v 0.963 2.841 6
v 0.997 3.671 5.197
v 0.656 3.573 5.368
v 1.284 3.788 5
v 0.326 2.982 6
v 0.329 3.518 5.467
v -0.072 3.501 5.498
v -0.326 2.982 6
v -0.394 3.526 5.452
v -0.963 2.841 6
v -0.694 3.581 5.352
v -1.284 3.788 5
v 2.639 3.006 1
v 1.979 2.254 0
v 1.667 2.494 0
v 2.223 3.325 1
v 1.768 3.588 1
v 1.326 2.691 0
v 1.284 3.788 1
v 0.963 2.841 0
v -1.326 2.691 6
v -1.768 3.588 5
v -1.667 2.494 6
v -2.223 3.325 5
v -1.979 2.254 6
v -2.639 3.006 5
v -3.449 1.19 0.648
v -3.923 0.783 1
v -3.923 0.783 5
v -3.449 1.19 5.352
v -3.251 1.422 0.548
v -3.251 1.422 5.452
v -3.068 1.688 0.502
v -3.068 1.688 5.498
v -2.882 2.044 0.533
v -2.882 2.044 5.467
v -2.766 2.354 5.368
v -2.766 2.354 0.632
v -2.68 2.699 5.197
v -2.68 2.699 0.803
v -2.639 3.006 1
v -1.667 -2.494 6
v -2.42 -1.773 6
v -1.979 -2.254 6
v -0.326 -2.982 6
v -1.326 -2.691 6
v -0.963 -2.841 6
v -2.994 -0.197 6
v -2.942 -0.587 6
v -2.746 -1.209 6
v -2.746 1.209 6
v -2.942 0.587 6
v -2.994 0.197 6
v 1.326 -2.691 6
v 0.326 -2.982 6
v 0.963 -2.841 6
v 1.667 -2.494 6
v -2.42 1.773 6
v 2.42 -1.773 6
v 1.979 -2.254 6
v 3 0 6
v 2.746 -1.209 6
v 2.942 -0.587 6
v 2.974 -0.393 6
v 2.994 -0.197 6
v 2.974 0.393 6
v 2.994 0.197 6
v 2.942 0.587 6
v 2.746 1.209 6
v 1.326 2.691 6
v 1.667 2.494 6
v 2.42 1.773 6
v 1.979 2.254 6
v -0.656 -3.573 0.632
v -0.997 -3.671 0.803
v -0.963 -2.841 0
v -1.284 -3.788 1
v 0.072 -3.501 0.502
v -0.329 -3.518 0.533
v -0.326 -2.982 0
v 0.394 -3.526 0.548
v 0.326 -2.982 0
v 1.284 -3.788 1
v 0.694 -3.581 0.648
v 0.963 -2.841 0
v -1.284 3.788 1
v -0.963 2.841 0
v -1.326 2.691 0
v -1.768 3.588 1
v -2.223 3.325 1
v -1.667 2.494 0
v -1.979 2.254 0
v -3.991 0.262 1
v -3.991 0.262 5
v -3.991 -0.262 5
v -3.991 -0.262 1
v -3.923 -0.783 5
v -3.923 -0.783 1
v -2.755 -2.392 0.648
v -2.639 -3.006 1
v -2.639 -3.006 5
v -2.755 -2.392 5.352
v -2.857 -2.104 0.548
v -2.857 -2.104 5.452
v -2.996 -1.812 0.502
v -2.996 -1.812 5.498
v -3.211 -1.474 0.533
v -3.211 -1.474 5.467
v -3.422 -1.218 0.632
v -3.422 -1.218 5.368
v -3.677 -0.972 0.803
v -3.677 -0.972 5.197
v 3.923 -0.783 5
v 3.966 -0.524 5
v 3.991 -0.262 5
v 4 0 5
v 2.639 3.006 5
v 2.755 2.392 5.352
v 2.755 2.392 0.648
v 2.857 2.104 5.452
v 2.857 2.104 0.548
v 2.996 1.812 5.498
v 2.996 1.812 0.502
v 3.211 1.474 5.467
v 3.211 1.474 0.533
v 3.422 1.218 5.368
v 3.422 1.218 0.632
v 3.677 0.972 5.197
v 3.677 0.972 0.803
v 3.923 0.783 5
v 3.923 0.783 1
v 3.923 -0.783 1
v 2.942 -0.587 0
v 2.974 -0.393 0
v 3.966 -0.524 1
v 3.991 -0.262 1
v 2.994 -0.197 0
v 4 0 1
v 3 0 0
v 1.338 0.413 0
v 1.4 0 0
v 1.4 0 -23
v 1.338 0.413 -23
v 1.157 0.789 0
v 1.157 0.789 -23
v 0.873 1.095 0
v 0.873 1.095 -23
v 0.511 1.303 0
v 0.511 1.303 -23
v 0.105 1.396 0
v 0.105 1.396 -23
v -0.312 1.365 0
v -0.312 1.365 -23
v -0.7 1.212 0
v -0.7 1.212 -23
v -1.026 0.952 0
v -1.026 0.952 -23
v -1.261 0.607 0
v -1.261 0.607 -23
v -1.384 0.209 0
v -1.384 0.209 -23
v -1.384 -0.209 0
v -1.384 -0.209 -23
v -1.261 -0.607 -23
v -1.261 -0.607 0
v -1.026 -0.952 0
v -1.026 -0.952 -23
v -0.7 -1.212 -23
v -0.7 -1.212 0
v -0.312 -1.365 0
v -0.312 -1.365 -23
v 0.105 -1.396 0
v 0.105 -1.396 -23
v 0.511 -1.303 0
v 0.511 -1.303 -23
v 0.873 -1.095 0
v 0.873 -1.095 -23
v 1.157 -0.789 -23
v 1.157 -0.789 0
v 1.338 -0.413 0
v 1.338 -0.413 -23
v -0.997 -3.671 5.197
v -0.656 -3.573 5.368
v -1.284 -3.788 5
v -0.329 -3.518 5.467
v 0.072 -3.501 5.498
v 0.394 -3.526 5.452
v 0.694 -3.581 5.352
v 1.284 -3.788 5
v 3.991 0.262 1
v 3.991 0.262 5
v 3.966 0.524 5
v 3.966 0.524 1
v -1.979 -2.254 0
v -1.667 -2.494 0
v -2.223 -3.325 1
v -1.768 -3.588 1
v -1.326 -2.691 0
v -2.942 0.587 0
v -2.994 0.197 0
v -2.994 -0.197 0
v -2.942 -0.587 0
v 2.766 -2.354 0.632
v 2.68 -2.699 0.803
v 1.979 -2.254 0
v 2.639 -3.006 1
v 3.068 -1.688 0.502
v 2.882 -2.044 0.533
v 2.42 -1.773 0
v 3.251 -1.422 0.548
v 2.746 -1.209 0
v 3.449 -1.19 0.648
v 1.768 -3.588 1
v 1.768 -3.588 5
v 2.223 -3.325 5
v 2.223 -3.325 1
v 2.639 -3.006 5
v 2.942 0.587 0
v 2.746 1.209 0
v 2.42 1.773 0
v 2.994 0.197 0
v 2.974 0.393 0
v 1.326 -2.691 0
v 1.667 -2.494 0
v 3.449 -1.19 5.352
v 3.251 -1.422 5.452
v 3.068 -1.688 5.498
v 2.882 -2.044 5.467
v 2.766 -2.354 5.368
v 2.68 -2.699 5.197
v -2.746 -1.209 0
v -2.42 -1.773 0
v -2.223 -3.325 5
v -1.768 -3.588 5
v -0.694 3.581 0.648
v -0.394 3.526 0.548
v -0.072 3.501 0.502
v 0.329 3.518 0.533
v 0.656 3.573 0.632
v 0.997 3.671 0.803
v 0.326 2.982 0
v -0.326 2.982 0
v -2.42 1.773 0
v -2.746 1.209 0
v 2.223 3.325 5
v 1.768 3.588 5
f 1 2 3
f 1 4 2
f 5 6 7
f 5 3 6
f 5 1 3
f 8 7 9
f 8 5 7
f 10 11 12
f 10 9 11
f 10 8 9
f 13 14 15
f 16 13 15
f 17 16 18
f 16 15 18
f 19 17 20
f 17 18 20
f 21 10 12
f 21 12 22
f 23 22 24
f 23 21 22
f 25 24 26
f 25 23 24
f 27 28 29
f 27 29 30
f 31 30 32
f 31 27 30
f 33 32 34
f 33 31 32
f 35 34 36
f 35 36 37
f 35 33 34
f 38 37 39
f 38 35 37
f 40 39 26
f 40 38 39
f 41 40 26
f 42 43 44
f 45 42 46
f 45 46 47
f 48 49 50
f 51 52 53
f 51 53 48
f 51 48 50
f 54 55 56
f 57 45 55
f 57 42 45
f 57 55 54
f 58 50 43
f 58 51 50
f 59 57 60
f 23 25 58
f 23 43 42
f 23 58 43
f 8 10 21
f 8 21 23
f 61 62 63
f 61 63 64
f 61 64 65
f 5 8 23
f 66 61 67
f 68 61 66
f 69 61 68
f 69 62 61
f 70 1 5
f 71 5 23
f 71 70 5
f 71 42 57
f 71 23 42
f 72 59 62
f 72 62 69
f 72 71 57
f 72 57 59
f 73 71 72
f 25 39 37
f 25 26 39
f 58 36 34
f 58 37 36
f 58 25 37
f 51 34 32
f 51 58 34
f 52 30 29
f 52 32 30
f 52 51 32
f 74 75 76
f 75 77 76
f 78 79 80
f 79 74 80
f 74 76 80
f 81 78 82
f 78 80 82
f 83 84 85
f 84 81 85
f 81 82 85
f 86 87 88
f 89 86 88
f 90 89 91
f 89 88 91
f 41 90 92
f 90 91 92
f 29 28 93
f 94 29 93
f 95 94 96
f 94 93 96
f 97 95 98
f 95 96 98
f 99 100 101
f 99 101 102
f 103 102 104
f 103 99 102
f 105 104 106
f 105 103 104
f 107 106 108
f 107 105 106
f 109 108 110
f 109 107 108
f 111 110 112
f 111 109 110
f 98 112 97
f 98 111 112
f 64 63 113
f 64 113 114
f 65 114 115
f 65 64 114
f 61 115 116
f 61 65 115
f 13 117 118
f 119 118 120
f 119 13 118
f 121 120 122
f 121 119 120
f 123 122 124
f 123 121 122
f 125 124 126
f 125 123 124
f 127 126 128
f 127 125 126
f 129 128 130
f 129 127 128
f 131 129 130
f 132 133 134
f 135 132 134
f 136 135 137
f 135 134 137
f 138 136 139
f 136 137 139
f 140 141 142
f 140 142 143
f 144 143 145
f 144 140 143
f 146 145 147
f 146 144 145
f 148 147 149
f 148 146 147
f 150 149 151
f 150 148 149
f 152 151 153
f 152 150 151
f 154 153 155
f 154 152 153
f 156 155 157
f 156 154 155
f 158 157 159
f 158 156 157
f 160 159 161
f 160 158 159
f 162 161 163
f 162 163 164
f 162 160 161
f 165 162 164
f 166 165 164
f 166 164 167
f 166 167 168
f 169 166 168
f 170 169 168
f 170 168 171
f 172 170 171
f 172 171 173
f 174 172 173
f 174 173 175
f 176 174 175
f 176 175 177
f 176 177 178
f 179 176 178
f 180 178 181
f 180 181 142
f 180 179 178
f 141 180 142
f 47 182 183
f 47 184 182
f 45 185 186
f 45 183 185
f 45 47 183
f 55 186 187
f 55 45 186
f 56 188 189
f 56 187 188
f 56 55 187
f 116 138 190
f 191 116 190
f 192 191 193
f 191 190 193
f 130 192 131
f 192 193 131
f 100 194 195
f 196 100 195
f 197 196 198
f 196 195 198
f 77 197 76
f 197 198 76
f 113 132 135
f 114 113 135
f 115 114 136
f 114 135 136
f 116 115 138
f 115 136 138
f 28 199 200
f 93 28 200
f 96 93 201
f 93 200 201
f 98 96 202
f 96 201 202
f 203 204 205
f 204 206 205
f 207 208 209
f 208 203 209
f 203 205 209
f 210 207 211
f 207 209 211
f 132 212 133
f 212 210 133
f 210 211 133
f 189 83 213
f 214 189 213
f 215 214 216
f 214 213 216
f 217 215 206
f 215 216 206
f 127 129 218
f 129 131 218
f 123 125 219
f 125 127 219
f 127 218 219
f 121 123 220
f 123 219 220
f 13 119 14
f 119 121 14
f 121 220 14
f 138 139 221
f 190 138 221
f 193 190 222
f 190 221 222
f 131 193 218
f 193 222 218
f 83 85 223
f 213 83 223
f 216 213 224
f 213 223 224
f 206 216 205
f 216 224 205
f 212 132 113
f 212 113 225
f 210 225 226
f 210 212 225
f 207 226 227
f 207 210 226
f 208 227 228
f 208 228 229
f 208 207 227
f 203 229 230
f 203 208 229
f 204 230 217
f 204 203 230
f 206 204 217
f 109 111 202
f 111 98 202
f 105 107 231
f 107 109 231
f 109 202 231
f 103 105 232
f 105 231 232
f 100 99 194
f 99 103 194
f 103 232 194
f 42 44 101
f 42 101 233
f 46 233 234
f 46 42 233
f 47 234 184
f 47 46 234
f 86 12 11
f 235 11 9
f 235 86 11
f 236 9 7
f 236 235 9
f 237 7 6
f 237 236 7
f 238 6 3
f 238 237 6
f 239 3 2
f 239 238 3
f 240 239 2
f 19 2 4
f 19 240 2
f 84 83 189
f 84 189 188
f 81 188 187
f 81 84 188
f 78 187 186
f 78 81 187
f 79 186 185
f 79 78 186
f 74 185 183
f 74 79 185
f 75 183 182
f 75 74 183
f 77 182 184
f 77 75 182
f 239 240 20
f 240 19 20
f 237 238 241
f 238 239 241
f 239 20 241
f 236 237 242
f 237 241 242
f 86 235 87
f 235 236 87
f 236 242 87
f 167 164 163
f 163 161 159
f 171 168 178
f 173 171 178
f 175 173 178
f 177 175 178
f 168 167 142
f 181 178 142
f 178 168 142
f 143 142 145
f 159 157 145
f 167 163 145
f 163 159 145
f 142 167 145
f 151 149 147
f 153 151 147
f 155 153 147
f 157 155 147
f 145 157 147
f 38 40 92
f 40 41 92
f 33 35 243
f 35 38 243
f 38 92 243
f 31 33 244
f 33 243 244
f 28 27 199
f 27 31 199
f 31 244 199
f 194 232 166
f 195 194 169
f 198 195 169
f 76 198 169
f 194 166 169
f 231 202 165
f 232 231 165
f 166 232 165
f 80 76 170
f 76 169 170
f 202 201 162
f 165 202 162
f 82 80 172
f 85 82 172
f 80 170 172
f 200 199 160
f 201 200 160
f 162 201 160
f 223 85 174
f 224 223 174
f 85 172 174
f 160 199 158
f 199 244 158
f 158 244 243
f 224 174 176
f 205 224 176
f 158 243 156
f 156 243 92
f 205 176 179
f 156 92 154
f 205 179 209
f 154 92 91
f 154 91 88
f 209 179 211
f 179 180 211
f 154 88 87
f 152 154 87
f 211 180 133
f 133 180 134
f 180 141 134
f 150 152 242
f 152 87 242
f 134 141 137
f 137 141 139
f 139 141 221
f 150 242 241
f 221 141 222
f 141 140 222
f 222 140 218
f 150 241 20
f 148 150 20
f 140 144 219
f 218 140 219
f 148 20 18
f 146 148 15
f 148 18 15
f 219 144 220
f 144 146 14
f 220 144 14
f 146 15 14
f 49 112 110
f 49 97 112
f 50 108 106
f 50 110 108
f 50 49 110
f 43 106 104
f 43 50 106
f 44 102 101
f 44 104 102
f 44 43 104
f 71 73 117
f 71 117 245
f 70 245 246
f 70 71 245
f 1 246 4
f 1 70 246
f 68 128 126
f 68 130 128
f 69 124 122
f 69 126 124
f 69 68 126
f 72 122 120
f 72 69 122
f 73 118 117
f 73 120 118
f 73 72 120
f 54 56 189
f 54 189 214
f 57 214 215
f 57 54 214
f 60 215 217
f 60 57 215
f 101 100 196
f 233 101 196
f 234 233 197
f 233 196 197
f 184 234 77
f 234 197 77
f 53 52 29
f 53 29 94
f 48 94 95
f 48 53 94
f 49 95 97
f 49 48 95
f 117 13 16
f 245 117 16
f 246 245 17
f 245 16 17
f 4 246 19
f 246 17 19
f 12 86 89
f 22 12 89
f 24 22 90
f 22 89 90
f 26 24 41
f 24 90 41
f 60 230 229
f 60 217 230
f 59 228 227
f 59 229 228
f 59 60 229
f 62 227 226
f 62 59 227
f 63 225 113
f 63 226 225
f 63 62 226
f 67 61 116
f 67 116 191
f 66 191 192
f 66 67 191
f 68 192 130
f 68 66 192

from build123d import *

# Parameters (mm, degrees)
F0_R     = 1.4
F1_DEPTH = 6
F2_SIZE  = 1
F3_DEPTH = 6.001
F4_DEPTH = 23


with BuildPart() as f1:
    # F0 (on Top) → F1 (new body)
    with BuildSketch(Plane.XY):
        with BuildLine():
            ThreePointArc((3.9226903411, -0.7826241038), (3.9806256647, -0.3932166296), (4, 0))
            ThreePointArc((4, 0), (3.9806256647, 0.3932166296), (3.9226903411, 0.7826241038))
            ThreePointArc((3.9226903411, 0.7826241038), (3.0310889132, 1.75), (2.639117526, 3.0058374347))
            ThreePointArc((2.639117526, 3.0058374347), (2, 3.4641016151), (1.2835728151, 3.7884615385))
            ThreePointArc((1.2835728151, 3.7884615385), (0, 3.5), (-1.2835728151, 3.7884615385))
            ThreePointArc((-1.2835728151, 3.7884615385), (-2, 3.4641016151), (-2.639117526, 3.0058374347))
            ThreePointArc((-2.639117526, 3.0058374347), (-3.0310889132, 1.75), (-3.9226903411, 0.7826241038))
            ThreePointArc((-3.9226903411, 0.7826241038), (-4, 0), (-3.9226903411, -0.7826241038))
            ThreePointArc((-3.9226903411, -0.7826241038), (-3.0310889132, -1.75), (-2.639117526, -3.0058374347))
            ThreePointArc((-2.639117526, -3.0058374347), (-2, -3.4641016151), (-1.2835728151, -3.7884615385))
            ThreePointArc((-1.2835728151, -3.7884615385), (0, -3.5), (1.2835728151, -3.7884615385))
            ThreePointArc((1.2835728151, -3.7884615385), (2, -3.4641016151), (2.639117526, -3.0058374347))
            ThreePointArc((2.639117526, -3.0058374347), (3.0310889132, -1.75), (3.9226903411, -0.7826241038))
        make_face()
        Circle(F0_R, mode=Mode.SUBTRACT)
        Circle(F0_R)
        with BuildLine():
            ThreePointArc((-1.2835728151, 3.7884615385), (0, 3.5), (1.2835728151, 3.7884615385))
            ThreePointArc((1.2835728151, 3.7884615385), (0, 4), (-1.2835728151, 3.7884615385))
        make_face()
        with BuildLine():
            ThreePointArc((2.639117526, 3.0058374347), (3.0310889132, 1.75), (3.9226903411, 0.7826241038))
            ThreePointArc((3.9226903411, 0.7826241038), (3.4641016151, 2), (2.639117526, 3.0058374347))
        make_face()
        with BuildLine():
            ThreePointArc((2.639117526, -3.0058374347), (3.4641016151, -2), (3.9226903411, -0.7826241038))
            ThreePointArc((3.9226903411, -0.7826241038), (3.0310889132, -1.75), (2.639117526, -3.0058374347))
        make_face()
        with BuildLine():
            ThreePointArc((-1.2835728151, -3.7884615385), (0, -4), (1.2835728151, -3.7884615385))
            ThreePointArc((1.2835728151, -3.7884615385), (0, -3.5), (-1.2835728151, -3.7884615385))
        make_face()
        with BuildLine():
            ThreePointArc((-3.9226903411, -0.7826241038), (-3.4641016151, -2), (-2.639117526, -3.0058374347))
            ThreePointArc((-2.639117526, -3.0058374347), (-3.0310889132, -1.75), (-3.9226903411, -0.7826241038))
        make_face()
        with BuildLine():
            ThreePointArc((-3.9226903411, 0.7826241038), (-3.0310889132, 1.75), (-2.639117526, 3.0058374347))
            ThreePointArc((-2.639117526, 3.0058374347), (-3.4641016151, 2), (-3.9226903411, 0.7826241038))
        make_face()
    extrude(amount=F1_DEPTH)

    # F2
    f2_edges = [f1.edges().sort_by_distance(p)[0] for p in [
        (2.639118, -3.005837, 6),
        (2.639118, -3.005837, 0),
    ]]
    chamfer(f2_edges, length=F2_SIZE)

    # F0 (on Top) → F3 (cut, through all)
    with BuildSketch(Plane.XY):
        with BuildLine():
            ThreePointArc((-1.2835728151, -3.7884615385), (0, -4), (1.2835728151, -3.7884615385))
            ThreePointArc((1.2835728151, -3.7884615385), (0, -3.5), (-1.2835728151, -3.7884615385))
        make_face()
        with BuildLine():
            ThreePointArc((-3.9226903411, -0.7826241038), (-3.4641016151, -2), (-2.639117526, -3.0058374347))
            ThreePointArc((-2.639117526, -3.0058374347), (-3.0310889132, -1.75), (-3.9226903411, -0.7826241038))
        make_face()
        with BuildLine():
            ThreePointArc((2.639117526, -3.0058374347), (3.4641016151, -2), (3.9226903411, -0.7826241038))
            ThreePointArc((3.9226903411, -0.7826241038), (3.0310889132, -1.75), (2.639117526, -3.0058374347))
        make_face()
        with BuildLine():
            ThreePointArc((2.639117526, 3.0058374347), (3.0310889132, 1.75), (3.9226903411, 0.7826241038))
            ThreePointArc((3.9226903411, 0.7826241038), (3.4641016151, 2), (2.639117526, 3.0058374347))
        make_face()
        with BuildLine():
            ThreePointArc((-1.2835728151, 3.7884615385), (0, 3.5), (1.2835728151, 3.7884615385))
            ThreePointArc((1.2835728151, 3.7884615385), (0, 4), (-1.2835728151, 3.7884615385))
        make_face()
        with BuildLine():
            ThreePointArc((-3.9226903411, 0.7826241038), (-3.0310889132, 1.75), (-2.639117526, 3.0058374347))
            ThreePointArc((-2.639117526, 3.0058374347), (-3.4641016151, 2), (-3.9226903411, 0.7826241038))
        make_face()
    extrude(amount=F3_DEPTH, mode=Mode.SUBTRACT)

    # F0 (on Top) → F4 (join)
    with BuildSketch(Plane.XY):
        Circle(F0_R)
    extrude(amount=-F4_DEPTH)


solid = f1.part
